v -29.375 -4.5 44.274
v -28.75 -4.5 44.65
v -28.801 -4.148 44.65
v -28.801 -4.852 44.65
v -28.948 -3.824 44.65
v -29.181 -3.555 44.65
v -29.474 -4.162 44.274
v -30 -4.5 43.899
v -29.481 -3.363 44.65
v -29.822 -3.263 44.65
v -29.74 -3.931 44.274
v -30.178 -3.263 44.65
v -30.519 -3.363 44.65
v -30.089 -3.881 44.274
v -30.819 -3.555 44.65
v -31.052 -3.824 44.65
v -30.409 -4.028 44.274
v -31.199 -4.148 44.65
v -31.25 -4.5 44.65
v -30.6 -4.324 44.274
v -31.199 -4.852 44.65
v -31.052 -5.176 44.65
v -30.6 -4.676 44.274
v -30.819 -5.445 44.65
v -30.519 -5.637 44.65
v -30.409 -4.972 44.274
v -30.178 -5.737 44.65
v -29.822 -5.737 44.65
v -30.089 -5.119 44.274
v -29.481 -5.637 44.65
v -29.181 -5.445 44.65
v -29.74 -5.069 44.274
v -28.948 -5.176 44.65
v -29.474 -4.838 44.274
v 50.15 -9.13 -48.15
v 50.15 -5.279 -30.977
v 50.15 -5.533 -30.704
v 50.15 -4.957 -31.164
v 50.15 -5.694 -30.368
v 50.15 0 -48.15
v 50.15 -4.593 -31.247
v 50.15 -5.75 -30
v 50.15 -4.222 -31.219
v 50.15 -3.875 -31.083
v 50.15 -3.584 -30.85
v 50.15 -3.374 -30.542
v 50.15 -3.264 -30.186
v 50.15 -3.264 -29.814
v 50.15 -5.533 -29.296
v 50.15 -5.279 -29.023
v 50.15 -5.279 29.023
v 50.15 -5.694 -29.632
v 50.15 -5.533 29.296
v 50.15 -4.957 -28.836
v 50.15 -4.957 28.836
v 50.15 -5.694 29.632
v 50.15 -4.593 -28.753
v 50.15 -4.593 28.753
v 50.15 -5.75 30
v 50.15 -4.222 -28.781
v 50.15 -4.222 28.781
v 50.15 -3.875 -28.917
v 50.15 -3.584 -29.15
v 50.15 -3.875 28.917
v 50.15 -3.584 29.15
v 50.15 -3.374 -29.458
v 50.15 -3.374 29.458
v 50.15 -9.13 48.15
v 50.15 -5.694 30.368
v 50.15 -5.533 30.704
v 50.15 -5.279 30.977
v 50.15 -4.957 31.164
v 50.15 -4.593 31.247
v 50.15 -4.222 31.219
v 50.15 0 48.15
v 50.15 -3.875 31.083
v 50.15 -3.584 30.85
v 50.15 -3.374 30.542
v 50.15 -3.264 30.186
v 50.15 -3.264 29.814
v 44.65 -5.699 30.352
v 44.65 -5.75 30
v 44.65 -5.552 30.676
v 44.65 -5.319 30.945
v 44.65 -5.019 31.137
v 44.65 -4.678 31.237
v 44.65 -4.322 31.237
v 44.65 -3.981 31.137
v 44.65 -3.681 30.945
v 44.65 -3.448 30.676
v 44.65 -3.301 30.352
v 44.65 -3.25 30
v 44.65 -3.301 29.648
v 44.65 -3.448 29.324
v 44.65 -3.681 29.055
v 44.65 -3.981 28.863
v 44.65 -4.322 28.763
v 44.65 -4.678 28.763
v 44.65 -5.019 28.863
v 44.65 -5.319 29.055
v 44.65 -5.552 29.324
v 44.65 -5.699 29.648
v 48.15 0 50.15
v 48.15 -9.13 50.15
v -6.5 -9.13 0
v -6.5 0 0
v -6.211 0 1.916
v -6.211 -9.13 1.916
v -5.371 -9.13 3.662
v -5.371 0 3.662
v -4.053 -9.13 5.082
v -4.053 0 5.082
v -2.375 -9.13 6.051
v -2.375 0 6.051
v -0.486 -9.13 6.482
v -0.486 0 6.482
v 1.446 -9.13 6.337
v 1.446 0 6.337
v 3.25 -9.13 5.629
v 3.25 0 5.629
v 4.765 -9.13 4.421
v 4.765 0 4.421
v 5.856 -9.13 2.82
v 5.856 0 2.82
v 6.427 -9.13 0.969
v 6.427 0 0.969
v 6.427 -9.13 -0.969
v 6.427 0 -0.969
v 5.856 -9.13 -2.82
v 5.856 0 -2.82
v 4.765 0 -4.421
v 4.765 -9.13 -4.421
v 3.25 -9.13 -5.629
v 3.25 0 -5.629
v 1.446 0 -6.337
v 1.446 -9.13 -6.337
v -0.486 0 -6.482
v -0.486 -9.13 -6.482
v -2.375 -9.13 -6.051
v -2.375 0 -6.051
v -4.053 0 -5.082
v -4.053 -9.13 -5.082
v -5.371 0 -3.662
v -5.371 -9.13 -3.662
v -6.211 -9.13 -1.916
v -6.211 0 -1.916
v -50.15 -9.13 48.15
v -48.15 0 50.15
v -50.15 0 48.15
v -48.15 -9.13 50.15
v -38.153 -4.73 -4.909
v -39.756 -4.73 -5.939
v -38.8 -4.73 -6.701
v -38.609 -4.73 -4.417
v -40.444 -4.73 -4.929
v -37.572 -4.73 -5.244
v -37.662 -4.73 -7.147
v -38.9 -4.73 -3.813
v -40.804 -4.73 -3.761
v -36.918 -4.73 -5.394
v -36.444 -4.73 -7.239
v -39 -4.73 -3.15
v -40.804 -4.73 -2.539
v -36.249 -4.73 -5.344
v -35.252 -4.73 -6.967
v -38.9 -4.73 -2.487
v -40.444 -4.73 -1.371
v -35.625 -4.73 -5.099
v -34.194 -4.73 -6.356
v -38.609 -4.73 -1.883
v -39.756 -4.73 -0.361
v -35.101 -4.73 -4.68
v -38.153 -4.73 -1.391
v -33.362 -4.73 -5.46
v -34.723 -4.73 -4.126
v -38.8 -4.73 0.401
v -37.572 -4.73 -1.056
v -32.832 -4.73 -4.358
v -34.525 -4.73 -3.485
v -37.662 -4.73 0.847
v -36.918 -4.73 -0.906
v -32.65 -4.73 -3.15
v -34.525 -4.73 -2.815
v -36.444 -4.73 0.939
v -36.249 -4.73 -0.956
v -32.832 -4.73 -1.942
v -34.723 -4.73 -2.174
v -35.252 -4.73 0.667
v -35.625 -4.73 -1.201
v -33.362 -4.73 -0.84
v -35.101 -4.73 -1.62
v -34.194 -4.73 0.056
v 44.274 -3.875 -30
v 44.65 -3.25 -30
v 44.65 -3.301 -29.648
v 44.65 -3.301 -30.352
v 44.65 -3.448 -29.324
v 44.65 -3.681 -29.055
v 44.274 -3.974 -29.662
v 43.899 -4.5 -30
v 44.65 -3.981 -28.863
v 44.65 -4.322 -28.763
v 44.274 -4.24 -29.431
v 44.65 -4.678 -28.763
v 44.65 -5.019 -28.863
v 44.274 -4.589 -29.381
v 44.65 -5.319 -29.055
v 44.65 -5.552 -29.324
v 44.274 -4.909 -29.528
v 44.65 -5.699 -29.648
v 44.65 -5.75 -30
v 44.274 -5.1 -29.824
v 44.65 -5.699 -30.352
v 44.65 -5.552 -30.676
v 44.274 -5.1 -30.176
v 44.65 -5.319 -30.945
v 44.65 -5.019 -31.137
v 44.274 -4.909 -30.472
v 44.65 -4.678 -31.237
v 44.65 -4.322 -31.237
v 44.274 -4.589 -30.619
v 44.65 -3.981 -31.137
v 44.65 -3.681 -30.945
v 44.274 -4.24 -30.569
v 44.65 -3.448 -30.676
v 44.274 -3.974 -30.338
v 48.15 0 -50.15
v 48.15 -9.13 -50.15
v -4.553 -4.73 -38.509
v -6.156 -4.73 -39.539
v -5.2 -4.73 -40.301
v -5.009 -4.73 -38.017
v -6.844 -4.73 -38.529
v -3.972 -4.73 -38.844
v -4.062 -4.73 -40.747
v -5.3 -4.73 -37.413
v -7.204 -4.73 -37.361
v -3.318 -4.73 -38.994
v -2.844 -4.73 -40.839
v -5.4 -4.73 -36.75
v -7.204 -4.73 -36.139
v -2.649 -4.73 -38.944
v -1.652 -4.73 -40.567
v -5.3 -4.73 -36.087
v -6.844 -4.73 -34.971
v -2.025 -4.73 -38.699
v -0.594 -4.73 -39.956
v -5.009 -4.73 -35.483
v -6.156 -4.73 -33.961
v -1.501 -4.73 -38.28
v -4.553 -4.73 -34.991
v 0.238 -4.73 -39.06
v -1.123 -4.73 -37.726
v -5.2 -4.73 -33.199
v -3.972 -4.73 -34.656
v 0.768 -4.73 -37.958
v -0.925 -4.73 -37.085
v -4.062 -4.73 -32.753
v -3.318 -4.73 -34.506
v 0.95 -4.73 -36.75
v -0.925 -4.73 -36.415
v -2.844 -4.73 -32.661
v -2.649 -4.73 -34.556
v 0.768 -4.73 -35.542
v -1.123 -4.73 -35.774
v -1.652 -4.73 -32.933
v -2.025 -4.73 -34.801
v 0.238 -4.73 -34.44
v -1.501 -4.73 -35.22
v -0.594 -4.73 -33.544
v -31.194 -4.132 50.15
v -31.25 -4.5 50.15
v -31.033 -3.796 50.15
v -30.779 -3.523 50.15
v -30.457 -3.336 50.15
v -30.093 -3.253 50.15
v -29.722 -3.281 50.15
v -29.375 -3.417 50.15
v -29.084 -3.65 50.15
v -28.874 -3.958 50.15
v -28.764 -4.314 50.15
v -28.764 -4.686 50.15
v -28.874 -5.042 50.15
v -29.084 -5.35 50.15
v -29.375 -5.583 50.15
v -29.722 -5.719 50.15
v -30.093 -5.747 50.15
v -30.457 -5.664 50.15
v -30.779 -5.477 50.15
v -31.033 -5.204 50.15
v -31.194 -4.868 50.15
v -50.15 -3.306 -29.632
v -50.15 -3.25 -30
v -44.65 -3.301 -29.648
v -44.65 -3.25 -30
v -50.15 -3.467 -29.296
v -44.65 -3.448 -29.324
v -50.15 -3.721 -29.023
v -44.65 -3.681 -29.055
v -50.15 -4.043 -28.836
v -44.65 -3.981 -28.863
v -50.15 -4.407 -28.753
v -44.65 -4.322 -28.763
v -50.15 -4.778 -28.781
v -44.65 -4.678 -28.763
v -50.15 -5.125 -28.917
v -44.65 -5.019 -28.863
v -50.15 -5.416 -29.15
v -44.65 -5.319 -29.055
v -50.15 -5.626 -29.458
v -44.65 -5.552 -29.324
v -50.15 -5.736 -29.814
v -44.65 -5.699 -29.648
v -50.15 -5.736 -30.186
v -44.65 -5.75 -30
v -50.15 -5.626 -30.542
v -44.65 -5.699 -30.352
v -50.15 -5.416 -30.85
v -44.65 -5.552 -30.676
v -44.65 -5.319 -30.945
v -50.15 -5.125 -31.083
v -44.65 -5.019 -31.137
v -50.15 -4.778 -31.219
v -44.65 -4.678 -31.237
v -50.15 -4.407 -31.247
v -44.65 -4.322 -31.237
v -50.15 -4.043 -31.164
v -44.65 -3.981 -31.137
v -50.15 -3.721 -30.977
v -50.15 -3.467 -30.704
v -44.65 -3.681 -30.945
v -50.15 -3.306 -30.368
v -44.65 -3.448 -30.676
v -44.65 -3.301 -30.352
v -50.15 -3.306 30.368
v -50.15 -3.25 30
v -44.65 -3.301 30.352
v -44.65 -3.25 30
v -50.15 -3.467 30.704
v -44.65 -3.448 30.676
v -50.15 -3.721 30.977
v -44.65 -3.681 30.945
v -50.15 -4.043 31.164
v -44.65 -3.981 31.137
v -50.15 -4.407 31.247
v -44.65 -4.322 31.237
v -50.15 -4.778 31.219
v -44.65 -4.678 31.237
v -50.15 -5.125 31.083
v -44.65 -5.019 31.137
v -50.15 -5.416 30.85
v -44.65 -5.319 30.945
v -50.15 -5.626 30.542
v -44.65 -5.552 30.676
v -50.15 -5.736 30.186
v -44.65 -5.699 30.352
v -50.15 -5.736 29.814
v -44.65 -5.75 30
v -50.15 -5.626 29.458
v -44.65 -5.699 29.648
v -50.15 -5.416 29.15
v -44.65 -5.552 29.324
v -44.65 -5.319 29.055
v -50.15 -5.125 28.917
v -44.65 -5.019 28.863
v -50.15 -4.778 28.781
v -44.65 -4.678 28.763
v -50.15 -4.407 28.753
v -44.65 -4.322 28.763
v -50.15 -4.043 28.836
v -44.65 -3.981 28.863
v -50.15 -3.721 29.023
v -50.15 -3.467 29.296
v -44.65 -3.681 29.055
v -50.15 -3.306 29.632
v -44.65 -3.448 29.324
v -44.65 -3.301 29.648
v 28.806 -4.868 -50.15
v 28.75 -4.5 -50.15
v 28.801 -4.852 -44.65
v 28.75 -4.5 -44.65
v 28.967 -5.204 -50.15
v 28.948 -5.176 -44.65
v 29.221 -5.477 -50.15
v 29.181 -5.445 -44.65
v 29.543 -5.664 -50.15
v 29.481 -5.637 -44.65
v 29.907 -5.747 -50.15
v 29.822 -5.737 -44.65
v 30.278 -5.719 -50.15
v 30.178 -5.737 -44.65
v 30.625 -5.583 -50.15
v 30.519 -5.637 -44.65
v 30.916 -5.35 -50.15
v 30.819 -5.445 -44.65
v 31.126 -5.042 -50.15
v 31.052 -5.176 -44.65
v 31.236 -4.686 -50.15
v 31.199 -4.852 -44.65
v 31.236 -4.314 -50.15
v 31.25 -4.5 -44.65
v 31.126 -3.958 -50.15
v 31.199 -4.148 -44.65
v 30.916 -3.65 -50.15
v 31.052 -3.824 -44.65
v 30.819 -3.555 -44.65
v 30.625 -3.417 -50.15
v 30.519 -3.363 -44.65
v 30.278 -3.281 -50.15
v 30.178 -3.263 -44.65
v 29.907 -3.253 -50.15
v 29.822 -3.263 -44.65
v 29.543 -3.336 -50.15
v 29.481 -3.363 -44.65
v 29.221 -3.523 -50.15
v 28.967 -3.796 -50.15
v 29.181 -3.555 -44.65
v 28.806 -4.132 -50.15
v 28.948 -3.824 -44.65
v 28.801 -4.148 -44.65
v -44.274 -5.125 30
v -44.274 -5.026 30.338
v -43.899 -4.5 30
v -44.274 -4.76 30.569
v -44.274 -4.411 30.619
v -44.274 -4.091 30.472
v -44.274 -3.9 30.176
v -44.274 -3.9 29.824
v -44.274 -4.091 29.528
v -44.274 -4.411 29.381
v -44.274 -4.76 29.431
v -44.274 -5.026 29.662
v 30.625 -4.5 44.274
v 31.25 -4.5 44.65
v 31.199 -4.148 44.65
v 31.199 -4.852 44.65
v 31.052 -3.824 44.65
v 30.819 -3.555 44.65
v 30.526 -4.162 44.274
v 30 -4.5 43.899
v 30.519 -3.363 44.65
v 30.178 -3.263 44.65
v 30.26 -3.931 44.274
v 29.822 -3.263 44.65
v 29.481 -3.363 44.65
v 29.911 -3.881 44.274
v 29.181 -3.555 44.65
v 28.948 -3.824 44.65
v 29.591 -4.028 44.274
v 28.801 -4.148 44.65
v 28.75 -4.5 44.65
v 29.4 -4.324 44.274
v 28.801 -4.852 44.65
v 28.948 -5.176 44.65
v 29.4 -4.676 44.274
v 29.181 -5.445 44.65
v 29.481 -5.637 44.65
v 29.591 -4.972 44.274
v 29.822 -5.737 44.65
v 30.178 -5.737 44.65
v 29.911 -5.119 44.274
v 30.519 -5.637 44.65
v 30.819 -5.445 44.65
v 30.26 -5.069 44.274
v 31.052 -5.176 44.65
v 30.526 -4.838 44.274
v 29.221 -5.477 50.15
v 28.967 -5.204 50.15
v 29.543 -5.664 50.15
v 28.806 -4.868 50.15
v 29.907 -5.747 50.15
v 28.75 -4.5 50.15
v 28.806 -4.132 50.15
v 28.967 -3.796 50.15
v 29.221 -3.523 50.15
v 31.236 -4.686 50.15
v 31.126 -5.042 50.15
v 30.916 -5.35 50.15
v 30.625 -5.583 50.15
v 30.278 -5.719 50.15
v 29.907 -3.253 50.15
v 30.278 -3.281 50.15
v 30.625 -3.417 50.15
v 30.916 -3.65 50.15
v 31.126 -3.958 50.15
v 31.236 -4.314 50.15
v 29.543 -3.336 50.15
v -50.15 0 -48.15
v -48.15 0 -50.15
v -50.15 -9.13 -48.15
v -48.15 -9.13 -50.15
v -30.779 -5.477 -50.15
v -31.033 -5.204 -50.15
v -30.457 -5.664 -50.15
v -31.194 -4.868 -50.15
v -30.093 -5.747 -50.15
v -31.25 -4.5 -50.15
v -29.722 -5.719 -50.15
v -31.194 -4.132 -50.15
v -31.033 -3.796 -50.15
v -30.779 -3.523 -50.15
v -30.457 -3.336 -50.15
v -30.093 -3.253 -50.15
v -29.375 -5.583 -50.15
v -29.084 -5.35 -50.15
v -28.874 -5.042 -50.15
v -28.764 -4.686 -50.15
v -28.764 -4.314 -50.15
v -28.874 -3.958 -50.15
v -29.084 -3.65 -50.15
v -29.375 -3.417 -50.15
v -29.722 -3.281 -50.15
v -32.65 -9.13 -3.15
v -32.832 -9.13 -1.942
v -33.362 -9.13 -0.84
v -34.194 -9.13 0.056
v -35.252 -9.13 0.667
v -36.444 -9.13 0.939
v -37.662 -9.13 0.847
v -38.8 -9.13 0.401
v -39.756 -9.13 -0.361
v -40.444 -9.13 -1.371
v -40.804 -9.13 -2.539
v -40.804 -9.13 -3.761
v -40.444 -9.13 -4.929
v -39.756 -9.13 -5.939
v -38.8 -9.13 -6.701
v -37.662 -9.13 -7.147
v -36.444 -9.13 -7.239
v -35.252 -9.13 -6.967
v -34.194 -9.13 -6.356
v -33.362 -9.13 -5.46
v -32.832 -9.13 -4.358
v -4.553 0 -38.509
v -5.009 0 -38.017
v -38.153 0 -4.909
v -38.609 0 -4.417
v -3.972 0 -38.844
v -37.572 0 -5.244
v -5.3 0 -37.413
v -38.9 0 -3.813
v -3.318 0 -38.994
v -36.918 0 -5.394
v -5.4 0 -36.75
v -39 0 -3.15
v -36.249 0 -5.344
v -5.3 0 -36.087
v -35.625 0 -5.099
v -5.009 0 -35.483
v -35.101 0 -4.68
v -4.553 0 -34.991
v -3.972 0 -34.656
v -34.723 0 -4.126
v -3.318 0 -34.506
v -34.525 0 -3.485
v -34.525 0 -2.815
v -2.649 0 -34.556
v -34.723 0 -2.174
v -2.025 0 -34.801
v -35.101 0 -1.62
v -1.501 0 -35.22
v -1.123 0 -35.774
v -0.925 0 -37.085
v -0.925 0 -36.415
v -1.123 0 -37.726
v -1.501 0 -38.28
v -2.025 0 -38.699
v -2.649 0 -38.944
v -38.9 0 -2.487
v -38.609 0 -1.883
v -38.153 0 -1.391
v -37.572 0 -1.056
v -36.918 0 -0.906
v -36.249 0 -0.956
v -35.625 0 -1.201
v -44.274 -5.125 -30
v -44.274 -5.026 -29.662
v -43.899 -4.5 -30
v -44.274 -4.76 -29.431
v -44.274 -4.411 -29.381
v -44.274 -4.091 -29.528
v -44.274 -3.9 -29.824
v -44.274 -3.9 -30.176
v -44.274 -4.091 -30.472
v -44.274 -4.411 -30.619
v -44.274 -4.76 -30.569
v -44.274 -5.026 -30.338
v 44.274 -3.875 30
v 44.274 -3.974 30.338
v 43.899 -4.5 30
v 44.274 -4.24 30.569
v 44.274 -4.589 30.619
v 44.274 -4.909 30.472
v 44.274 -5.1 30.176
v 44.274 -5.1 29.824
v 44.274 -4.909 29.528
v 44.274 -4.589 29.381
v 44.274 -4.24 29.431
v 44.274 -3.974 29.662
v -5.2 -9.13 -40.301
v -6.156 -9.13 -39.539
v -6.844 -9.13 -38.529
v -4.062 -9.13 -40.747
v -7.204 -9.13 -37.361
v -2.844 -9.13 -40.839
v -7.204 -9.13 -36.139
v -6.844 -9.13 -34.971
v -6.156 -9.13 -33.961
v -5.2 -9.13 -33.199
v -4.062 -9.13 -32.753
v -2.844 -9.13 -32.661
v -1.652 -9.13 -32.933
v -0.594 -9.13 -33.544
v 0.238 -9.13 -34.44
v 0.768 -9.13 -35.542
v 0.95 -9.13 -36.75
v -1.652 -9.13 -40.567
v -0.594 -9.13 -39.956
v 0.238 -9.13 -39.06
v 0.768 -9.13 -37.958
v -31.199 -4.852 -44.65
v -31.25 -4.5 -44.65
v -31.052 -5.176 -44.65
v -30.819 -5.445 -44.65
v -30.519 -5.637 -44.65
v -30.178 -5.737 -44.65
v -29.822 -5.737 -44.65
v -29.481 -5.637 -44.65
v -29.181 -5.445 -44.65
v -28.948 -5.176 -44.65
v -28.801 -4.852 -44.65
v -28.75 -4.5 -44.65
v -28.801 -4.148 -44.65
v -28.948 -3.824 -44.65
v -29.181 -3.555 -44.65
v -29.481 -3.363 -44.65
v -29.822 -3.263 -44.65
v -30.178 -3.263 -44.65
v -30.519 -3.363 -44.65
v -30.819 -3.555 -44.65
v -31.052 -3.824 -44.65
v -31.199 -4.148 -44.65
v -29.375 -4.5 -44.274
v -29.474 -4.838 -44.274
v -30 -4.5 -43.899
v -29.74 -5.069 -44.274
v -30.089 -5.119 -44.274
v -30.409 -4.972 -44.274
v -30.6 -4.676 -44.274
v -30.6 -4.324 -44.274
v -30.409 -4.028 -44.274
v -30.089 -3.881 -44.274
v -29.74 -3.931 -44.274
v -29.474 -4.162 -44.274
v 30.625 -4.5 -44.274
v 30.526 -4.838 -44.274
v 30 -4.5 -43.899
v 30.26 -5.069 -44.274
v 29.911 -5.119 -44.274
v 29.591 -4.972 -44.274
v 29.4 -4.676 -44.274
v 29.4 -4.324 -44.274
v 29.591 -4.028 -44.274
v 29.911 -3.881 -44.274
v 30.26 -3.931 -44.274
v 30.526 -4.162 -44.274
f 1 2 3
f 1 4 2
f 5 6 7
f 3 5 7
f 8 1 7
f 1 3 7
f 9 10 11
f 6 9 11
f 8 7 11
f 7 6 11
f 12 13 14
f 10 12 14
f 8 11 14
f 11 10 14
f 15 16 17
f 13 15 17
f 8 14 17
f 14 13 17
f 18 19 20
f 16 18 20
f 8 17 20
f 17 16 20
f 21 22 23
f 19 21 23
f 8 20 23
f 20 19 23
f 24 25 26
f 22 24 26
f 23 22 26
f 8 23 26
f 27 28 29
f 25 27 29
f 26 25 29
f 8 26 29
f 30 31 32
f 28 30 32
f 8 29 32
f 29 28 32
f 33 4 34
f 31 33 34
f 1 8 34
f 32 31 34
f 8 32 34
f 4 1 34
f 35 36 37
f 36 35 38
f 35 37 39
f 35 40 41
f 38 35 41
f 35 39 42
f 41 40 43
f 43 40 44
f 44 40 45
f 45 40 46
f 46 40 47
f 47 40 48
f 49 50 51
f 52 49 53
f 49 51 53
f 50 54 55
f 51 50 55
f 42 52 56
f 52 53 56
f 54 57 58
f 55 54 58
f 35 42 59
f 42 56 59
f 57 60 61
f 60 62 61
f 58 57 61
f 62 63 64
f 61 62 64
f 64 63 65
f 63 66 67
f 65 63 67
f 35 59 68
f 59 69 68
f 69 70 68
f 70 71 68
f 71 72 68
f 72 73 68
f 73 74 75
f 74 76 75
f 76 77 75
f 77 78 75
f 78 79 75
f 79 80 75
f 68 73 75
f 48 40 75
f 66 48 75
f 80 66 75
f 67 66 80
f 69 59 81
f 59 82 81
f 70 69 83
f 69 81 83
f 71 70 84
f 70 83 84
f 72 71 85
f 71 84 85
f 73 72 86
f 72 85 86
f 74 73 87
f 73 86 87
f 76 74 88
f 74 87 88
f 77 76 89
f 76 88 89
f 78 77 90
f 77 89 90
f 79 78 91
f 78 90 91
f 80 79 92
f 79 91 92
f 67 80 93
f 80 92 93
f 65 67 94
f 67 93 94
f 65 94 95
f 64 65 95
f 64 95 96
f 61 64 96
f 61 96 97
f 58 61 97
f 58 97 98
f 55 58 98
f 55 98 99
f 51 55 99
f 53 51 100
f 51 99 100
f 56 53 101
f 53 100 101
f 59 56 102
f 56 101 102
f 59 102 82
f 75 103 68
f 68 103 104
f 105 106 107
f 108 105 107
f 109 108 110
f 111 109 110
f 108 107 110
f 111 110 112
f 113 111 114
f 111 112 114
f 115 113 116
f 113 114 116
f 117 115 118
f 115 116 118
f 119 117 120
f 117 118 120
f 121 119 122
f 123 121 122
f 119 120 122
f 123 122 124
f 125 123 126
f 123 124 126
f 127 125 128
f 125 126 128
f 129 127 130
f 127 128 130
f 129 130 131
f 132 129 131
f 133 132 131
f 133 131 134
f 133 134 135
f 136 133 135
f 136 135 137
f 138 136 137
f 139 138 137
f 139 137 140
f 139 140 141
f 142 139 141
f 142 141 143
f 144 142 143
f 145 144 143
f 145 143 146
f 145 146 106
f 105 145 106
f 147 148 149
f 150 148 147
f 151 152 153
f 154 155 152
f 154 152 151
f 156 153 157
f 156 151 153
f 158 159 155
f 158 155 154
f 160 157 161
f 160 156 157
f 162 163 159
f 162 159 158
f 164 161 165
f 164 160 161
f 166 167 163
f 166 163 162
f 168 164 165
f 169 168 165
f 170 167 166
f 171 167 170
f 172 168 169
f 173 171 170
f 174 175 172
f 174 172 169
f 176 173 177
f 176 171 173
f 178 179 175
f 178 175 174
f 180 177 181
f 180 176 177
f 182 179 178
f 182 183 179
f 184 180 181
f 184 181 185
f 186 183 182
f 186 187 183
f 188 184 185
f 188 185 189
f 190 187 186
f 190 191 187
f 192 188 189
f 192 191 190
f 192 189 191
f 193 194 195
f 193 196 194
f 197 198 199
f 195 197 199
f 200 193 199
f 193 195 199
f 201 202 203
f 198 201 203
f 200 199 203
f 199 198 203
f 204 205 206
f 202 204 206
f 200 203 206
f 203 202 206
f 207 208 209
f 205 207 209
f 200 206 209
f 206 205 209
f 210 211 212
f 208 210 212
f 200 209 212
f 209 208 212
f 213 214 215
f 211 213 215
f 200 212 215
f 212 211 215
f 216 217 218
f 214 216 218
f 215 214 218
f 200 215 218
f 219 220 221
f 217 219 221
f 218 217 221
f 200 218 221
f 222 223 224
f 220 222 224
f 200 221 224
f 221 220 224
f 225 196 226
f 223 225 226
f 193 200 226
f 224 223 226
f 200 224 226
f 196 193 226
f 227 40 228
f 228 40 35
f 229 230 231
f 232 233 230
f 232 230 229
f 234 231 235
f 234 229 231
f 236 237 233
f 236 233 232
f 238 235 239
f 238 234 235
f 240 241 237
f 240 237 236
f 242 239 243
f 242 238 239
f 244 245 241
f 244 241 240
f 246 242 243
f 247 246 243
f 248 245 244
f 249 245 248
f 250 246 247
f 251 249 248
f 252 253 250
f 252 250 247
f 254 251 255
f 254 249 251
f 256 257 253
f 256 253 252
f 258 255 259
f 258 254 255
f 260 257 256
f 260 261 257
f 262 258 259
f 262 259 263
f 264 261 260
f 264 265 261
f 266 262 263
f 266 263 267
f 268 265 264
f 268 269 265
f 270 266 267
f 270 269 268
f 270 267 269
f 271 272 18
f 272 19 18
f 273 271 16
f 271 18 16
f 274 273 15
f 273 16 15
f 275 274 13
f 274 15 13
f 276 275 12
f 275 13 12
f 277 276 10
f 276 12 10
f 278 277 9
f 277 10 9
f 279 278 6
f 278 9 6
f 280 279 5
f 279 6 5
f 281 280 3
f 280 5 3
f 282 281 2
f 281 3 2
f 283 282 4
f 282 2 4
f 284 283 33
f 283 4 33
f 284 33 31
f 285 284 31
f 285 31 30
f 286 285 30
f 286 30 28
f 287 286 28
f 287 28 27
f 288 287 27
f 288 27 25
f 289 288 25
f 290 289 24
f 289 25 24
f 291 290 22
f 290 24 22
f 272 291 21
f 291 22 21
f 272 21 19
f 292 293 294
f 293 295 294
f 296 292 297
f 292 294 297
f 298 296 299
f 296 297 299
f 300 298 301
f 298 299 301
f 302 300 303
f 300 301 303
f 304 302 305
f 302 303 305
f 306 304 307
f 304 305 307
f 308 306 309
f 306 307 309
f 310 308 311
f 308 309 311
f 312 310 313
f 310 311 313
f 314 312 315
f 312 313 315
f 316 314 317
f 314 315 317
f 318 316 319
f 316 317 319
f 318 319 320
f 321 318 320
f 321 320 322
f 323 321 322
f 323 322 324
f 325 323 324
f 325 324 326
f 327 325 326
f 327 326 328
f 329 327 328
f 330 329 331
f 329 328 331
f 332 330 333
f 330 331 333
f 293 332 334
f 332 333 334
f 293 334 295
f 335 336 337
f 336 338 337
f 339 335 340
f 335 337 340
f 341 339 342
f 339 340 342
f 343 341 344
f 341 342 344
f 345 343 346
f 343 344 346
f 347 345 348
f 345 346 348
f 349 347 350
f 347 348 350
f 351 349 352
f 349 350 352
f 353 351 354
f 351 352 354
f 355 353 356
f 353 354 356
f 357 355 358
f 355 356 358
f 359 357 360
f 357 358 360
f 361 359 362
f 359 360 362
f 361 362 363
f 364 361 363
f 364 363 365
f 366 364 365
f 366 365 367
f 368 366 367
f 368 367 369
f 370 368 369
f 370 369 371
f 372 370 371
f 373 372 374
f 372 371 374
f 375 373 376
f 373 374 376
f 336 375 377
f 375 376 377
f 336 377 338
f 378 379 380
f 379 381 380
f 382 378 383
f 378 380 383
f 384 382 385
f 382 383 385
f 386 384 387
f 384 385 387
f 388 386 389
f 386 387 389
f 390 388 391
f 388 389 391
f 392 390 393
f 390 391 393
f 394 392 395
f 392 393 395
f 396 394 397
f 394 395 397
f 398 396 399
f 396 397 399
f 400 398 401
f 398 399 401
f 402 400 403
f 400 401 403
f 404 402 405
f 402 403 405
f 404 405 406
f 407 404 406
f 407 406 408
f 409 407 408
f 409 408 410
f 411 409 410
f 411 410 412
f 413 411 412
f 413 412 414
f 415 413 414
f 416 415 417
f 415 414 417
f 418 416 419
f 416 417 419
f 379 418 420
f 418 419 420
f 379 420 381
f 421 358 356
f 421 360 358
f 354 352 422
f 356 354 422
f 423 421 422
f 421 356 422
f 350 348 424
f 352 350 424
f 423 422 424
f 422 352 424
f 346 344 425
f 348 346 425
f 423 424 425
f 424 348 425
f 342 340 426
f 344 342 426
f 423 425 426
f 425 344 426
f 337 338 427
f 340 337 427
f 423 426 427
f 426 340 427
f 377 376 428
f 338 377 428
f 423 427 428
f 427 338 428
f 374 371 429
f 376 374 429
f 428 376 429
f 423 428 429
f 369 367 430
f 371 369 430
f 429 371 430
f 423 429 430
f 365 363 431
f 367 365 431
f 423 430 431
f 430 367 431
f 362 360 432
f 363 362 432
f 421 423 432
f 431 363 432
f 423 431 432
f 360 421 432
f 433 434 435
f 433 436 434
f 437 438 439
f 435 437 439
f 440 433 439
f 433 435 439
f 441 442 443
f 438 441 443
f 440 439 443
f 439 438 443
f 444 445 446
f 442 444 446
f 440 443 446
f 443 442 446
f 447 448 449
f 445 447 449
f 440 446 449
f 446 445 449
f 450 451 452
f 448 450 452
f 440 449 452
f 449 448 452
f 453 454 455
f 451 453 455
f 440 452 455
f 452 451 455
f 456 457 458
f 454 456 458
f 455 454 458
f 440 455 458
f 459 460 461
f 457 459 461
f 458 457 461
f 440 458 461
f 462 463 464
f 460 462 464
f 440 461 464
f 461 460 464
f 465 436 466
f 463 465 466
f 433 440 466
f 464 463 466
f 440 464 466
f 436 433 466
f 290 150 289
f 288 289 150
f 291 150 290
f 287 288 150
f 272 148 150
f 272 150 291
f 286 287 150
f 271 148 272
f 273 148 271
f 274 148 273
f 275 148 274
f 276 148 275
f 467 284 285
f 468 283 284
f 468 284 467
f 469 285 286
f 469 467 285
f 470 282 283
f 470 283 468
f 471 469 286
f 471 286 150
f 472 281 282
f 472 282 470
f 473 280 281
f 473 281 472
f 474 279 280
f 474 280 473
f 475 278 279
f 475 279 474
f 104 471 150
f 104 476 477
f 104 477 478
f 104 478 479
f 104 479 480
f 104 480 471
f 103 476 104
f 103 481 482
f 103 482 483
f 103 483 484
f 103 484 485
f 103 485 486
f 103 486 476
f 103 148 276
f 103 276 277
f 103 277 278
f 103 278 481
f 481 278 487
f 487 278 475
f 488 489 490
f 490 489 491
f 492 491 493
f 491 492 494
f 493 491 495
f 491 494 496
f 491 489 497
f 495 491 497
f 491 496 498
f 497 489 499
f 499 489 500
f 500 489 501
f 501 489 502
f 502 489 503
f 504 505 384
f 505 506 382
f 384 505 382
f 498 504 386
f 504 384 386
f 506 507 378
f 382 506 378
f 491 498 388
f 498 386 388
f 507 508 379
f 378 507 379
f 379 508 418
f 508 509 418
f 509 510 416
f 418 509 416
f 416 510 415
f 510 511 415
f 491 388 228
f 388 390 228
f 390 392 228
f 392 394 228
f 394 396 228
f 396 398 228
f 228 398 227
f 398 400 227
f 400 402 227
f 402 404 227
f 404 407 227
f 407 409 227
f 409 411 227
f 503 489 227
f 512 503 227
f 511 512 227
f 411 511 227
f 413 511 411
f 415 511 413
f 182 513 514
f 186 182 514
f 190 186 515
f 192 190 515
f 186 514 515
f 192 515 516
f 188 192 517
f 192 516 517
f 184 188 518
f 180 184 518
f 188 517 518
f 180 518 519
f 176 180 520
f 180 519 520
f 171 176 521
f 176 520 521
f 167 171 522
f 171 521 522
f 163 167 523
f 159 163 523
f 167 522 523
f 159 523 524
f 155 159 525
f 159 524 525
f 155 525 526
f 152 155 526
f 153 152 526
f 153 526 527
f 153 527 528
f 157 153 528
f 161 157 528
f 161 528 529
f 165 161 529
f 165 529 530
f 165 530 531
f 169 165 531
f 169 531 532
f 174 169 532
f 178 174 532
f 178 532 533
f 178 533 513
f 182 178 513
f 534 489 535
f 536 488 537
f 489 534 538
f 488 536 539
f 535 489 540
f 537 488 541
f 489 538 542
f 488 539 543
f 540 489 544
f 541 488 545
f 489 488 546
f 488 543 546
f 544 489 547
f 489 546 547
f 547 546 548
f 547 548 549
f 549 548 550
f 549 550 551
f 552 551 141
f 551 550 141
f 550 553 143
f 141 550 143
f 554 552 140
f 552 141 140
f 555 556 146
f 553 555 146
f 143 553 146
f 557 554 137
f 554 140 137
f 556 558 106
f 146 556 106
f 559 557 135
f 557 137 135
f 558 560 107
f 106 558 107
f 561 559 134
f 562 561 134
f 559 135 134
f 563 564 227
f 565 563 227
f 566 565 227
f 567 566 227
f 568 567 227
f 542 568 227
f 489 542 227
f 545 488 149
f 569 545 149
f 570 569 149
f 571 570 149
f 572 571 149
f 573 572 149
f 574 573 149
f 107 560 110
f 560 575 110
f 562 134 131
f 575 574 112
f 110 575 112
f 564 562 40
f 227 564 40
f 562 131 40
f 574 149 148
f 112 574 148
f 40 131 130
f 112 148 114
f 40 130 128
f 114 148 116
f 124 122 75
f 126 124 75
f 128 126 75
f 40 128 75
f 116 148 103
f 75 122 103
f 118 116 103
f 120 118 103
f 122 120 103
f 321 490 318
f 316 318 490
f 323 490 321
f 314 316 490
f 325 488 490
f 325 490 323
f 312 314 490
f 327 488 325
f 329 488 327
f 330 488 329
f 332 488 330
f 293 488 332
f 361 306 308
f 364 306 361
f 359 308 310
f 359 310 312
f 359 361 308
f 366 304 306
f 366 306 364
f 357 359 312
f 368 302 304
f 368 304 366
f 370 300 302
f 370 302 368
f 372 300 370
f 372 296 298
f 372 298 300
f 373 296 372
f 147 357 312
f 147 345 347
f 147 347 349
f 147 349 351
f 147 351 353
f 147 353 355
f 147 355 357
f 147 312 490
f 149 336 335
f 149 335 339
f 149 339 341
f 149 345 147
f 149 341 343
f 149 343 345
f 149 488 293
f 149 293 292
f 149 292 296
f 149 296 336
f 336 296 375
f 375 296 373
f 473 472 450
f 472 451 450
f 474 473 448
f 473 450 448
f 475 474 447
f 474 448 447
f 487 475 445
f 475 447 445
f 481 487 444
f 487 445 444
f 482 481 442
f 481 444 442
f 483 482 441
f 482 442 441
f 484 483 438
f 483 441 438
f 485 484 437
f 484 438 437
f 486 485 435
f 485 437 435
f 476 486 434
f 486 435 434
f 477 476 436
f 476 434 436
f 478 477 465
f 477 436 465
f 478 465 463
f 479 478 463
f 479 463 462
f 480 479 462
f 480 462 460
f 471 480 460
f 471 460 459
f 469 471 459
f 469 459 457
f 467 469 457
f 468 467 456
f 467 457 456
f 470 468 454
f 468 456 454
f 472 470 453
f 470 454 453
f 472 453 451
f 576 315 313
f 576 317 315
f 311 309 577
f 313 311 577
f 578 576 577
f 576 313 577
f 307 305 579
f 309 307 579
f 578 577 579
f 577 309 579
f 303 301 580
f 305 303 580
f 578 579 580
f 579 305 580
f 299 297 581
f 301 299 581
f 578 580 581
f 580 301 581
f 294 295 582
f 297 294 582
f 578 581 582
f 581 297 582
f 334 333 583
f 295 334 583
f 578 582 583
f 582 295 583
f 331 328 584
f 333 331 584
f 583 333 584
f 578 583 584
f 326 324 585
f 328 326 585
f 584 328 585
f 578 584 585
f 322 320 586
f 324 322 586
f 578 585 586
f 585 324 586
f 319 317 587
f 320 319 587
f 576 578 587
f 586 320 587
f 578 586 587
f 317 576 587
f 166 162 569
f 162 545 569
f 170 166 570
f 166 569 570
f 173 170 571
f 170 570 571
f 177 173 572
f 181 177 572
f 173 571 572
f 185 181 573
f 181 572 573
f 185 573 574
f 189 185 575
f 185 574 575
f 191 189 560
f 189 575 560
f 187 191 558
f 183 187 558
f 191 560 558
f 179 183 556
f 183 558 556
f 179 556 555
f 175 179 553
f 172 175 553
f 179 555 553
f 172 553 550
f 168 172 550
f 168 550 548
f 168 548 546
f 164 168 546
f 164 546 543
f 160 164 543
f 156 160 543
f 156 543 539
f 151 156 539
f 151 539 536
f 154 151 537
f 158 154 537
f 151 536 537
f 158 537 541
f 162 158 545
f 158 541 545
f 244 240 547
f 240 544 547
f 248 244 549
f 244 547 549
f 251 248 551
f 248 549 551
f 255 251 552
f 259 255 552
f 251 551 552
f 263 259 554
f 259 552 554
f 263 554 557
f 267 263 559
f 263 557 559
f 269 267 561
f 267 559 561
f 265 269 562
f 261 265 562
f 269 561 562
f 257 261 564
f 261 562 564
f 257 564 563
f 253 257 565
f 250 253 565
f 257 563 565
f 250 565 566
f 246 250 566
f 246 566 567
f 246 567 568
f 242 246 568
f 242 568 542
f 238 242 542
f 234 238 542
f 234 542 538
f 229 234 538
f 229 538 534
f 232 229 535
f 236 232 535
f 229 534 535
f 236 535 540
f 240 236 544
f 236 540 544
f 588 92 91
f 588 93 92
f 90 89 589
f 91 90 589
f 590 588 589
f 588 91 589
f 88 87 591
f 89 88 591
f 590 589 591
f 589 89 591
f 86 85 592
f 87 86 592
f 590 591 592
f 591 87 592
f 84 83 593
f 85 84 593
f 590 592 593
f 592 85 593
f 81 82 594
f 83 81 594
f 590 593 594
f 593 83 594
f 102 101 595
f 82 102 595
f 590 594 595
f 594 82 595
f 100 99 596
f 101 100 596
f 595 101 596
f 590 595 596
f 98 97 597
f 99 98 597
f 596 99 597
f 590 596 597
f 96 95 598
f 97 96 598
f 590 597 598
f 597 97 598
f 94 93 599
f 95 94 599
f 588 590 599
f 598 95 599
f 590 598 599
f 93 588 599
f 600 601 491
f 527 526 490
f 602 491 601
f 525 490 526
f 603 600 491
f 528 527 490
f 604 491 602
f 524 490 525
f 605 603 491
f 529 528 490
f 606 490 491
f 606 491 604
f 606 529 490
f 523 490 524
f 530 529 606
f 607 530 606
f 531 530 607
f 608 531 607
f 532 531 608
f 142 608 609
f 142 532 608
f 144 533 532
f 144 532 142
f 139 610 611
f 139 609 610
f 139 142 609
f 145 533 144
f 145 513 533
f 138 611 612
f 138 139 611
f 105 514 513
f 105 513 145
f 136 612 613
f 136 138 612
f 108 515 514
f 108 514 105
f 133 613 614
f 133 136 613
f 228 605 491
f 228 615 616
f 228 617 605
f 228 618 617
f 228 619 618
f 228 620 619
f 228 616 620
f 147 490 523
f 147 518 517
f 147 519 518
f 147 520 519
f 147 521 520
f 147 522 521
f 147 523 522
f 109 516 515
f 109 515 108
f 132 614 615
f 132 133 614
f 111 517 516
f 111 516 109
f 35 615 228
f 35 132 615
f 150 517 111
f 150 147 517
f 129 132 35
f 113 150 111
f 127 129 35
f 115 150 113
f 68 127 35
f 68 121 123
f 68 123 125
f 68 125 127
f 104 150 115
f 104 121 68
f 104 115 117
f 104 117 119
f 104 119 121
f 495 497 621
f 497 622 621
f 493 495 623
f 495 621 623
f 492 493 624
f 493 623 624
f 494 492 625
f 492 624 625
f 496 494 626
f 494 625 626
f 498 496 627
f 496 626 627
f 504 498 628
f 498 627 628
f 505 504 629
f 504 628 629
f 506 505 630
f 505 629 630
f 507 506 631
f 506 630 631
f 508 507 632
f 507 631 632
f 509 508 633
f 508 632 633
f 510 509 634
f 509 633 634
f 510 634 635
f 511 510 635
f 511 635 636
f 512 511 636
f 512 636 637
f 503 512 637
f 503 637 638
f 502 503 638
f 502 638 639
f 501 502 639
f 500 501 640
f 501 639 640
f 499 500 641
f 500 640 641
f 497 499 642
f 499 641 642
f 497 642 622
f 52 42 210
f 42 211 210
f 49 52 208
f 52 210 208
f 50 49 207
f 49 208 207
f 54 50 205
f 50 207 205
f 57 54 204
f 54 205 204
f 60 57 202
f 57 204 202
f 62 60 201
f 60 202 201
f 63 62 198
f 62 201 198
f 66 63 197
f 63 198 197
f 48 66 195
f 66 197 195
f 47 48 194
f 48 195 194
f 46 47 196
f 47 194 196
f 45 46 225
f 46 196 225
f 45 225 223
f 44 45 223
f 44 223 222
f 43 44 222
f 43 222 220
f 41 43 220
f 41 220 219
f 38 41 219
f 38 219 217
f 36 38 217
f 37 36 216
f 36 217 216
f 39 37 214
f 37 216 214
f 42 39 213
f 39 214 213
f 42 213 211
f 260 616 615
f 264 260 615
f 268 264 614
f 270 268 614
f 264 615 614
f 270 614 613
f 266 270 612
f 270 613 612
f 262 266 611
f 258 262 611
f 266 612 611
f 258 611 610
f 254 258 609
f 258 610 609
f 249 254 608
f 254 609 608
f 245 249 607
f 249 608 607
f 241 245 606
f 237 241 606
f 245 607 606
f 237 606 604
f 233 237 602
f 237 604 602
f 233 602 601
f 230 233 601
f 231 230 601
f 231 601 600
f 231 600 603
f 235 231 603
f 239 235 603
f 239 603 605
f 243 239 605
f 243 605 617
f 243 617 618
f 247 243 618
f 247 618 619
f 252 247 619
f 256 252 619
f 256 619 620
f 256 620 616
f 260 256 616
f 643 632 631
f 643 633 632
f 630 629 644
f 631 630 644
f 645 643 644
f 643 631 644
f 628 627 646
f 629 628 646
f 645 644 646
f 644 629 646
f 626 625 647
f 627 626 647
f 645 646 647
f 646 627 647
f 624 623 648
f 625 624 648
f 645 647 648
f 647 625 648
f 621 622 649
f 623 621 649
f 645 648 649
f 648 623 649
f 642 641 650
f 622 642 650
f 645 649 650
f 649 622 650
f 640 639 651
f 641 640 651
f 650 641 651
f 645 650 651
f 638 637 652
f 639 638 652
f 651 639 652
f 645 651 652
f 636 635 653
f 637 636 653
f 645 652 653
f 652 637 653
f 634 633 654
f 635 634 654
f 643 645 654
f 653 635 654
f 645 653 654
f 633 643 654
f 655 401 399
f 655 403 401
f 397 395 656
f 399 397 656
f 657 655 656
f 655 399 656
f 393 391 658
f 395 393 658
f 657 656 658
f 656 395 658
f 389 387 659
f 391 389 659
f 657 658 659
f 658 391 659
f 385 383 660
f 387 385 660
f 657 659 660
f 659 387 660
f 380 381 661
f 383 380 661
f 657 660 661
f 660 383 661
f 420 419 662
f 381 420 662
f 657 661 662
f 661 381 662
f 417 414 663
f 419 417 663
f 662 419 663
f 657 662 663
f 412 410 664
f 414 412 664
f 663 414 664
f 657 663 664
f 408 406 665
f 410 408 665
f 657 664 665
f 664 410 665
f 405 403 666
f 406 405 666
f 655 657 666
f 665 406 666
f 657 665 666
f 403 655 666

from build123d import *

# Parameters (mm, degrees)
F0_W            = 100.3
F0_H            = 100.3
F1_DEPTH        = 9.13
F2_SIZE         = 2
F4_D            = 4.5
F4_CBORE_D      = 8.2
F4_CBORE_DEPTH  = 4.4
F5_D            = 13
F10_D           = 2.5
F10_DEPTH       = 5.5
F10_TIP         = 0.7510757738
F10_ON_F7_D     = 2.5
F10_ON_F7_DEPTH = 5.5
F10_ON_F7_TIP   = 0.7510757738
F10_ON_F6_D     = 2.5
F10_ON_F6_DEPTH = 5.5
F10_ON_F6_TIP   = 0.7510757738
F10_ON_F9_D     = 2.5
F10_ON_F9_DEPTH = 5.5
F10_ON_F9_TIP   = 0.7510757738


with BuildPart() as f1:
    # F0 (on Front) → F1 (new body)
    with BuildSketch(Plane.XZ):
        Rectangle(F0_W, F0_H)
    extrude(amount=F1_DEPTH)

    # F2
    f2_edges = [f1.edges().sort_by_distance(p)[0] for p in [
        (-50.15, -4.565, -50.15),
        (50.15, -4.565, -50.15),
        (50.15, -4.565, 50.15),
        (-50.15, -4.565, 50.15),
    ]]
    chamfer(f2_edges, length=F2_SIZE)

    # F4 (through all)
    with Locations(Plane.XZ.offset(9.13)):
        with Locations((-36.75, -3.15), (-3.15, -36.75)):
            CounterBoreHole(F4_D / 2, F4_CBORE_D / 2, F4_CBORE_DEPTH)

    # F5 (through all)
    with Locations(Plane.XZ.offset(9.13)):
        with Locations((0, 0)):
            Hole(F5_D / 2)

    # F10
    with Locations(Plane(origin=(-50.15, 0, 0), x_dir=(0, -1, 0), z_dir=(-1, 0, 0))):
        with Locations((4.5, -30), (4.5, 30)):
            Hole(F10_D / 2, depth=F10_DEPTH)
            with Locations((0, 0, -(F10_DEPTH + F10_TIP / 2))):  # 118° drill point
                Cone(0, F10_D / 2, F10_TIP, mode=Mode.SUBTRACT)

    # F10 on F7
    with Locations(Plane.XY.offset(50.15)):
        with Locations((-30, -4.5), (30, -4.5)):
            Hole(F10_ON_F7_D / 2, depth=F10_ON_F7_DEPTH)
            with Locations((0, 0, -(F10_ON_F7_DEPTH + F10_ON_F7_TIP / 2))):  # 118° drill point
                Cone(0, F10_ON_F7_D / 2, F10_ON_F7_TIP, mode=Mode.SUBTRACT)

    # F10 on F6
    with Locations(Plane.YZ.offset(50.15)):
        with Locations((-4.5, -30), (-4.5, 30)):
            Hole(F10_ON_F6_D / 2, depth=F10_ON_F6_DEPTH)
            with Locations((0, 0, -(F10_ON_F6_DEPTH + F10_ON_F6_TIP / 2))):  # 118° drill point
                Cone(0, F10_ON_F6_D / 2, F10_ON_F6_TIP, mode=Mode.SUBTRACT)

    # F10 on F9
    with Locations(Plane(origin=(0, 0, -50.15), x_dir=(1, 0, 0), z_dir=(0, 0, -1))):
        with Locations((30, 4.5), (-30, 4.5)):
            Hole(F10_ON_F9_D / 2, depth=F10_ON_F9_DEPTH)
            with Locations((0, 0, -(F10_ON_F9_DEPTH + F10_ON_F9_TIP / 2))):  # 118° drill point
                Cone(0, F10_ON_F9_D / 2, F10_ON_F9_TIP, mode=Mode.SUBTRACT)


solid = f1.part
